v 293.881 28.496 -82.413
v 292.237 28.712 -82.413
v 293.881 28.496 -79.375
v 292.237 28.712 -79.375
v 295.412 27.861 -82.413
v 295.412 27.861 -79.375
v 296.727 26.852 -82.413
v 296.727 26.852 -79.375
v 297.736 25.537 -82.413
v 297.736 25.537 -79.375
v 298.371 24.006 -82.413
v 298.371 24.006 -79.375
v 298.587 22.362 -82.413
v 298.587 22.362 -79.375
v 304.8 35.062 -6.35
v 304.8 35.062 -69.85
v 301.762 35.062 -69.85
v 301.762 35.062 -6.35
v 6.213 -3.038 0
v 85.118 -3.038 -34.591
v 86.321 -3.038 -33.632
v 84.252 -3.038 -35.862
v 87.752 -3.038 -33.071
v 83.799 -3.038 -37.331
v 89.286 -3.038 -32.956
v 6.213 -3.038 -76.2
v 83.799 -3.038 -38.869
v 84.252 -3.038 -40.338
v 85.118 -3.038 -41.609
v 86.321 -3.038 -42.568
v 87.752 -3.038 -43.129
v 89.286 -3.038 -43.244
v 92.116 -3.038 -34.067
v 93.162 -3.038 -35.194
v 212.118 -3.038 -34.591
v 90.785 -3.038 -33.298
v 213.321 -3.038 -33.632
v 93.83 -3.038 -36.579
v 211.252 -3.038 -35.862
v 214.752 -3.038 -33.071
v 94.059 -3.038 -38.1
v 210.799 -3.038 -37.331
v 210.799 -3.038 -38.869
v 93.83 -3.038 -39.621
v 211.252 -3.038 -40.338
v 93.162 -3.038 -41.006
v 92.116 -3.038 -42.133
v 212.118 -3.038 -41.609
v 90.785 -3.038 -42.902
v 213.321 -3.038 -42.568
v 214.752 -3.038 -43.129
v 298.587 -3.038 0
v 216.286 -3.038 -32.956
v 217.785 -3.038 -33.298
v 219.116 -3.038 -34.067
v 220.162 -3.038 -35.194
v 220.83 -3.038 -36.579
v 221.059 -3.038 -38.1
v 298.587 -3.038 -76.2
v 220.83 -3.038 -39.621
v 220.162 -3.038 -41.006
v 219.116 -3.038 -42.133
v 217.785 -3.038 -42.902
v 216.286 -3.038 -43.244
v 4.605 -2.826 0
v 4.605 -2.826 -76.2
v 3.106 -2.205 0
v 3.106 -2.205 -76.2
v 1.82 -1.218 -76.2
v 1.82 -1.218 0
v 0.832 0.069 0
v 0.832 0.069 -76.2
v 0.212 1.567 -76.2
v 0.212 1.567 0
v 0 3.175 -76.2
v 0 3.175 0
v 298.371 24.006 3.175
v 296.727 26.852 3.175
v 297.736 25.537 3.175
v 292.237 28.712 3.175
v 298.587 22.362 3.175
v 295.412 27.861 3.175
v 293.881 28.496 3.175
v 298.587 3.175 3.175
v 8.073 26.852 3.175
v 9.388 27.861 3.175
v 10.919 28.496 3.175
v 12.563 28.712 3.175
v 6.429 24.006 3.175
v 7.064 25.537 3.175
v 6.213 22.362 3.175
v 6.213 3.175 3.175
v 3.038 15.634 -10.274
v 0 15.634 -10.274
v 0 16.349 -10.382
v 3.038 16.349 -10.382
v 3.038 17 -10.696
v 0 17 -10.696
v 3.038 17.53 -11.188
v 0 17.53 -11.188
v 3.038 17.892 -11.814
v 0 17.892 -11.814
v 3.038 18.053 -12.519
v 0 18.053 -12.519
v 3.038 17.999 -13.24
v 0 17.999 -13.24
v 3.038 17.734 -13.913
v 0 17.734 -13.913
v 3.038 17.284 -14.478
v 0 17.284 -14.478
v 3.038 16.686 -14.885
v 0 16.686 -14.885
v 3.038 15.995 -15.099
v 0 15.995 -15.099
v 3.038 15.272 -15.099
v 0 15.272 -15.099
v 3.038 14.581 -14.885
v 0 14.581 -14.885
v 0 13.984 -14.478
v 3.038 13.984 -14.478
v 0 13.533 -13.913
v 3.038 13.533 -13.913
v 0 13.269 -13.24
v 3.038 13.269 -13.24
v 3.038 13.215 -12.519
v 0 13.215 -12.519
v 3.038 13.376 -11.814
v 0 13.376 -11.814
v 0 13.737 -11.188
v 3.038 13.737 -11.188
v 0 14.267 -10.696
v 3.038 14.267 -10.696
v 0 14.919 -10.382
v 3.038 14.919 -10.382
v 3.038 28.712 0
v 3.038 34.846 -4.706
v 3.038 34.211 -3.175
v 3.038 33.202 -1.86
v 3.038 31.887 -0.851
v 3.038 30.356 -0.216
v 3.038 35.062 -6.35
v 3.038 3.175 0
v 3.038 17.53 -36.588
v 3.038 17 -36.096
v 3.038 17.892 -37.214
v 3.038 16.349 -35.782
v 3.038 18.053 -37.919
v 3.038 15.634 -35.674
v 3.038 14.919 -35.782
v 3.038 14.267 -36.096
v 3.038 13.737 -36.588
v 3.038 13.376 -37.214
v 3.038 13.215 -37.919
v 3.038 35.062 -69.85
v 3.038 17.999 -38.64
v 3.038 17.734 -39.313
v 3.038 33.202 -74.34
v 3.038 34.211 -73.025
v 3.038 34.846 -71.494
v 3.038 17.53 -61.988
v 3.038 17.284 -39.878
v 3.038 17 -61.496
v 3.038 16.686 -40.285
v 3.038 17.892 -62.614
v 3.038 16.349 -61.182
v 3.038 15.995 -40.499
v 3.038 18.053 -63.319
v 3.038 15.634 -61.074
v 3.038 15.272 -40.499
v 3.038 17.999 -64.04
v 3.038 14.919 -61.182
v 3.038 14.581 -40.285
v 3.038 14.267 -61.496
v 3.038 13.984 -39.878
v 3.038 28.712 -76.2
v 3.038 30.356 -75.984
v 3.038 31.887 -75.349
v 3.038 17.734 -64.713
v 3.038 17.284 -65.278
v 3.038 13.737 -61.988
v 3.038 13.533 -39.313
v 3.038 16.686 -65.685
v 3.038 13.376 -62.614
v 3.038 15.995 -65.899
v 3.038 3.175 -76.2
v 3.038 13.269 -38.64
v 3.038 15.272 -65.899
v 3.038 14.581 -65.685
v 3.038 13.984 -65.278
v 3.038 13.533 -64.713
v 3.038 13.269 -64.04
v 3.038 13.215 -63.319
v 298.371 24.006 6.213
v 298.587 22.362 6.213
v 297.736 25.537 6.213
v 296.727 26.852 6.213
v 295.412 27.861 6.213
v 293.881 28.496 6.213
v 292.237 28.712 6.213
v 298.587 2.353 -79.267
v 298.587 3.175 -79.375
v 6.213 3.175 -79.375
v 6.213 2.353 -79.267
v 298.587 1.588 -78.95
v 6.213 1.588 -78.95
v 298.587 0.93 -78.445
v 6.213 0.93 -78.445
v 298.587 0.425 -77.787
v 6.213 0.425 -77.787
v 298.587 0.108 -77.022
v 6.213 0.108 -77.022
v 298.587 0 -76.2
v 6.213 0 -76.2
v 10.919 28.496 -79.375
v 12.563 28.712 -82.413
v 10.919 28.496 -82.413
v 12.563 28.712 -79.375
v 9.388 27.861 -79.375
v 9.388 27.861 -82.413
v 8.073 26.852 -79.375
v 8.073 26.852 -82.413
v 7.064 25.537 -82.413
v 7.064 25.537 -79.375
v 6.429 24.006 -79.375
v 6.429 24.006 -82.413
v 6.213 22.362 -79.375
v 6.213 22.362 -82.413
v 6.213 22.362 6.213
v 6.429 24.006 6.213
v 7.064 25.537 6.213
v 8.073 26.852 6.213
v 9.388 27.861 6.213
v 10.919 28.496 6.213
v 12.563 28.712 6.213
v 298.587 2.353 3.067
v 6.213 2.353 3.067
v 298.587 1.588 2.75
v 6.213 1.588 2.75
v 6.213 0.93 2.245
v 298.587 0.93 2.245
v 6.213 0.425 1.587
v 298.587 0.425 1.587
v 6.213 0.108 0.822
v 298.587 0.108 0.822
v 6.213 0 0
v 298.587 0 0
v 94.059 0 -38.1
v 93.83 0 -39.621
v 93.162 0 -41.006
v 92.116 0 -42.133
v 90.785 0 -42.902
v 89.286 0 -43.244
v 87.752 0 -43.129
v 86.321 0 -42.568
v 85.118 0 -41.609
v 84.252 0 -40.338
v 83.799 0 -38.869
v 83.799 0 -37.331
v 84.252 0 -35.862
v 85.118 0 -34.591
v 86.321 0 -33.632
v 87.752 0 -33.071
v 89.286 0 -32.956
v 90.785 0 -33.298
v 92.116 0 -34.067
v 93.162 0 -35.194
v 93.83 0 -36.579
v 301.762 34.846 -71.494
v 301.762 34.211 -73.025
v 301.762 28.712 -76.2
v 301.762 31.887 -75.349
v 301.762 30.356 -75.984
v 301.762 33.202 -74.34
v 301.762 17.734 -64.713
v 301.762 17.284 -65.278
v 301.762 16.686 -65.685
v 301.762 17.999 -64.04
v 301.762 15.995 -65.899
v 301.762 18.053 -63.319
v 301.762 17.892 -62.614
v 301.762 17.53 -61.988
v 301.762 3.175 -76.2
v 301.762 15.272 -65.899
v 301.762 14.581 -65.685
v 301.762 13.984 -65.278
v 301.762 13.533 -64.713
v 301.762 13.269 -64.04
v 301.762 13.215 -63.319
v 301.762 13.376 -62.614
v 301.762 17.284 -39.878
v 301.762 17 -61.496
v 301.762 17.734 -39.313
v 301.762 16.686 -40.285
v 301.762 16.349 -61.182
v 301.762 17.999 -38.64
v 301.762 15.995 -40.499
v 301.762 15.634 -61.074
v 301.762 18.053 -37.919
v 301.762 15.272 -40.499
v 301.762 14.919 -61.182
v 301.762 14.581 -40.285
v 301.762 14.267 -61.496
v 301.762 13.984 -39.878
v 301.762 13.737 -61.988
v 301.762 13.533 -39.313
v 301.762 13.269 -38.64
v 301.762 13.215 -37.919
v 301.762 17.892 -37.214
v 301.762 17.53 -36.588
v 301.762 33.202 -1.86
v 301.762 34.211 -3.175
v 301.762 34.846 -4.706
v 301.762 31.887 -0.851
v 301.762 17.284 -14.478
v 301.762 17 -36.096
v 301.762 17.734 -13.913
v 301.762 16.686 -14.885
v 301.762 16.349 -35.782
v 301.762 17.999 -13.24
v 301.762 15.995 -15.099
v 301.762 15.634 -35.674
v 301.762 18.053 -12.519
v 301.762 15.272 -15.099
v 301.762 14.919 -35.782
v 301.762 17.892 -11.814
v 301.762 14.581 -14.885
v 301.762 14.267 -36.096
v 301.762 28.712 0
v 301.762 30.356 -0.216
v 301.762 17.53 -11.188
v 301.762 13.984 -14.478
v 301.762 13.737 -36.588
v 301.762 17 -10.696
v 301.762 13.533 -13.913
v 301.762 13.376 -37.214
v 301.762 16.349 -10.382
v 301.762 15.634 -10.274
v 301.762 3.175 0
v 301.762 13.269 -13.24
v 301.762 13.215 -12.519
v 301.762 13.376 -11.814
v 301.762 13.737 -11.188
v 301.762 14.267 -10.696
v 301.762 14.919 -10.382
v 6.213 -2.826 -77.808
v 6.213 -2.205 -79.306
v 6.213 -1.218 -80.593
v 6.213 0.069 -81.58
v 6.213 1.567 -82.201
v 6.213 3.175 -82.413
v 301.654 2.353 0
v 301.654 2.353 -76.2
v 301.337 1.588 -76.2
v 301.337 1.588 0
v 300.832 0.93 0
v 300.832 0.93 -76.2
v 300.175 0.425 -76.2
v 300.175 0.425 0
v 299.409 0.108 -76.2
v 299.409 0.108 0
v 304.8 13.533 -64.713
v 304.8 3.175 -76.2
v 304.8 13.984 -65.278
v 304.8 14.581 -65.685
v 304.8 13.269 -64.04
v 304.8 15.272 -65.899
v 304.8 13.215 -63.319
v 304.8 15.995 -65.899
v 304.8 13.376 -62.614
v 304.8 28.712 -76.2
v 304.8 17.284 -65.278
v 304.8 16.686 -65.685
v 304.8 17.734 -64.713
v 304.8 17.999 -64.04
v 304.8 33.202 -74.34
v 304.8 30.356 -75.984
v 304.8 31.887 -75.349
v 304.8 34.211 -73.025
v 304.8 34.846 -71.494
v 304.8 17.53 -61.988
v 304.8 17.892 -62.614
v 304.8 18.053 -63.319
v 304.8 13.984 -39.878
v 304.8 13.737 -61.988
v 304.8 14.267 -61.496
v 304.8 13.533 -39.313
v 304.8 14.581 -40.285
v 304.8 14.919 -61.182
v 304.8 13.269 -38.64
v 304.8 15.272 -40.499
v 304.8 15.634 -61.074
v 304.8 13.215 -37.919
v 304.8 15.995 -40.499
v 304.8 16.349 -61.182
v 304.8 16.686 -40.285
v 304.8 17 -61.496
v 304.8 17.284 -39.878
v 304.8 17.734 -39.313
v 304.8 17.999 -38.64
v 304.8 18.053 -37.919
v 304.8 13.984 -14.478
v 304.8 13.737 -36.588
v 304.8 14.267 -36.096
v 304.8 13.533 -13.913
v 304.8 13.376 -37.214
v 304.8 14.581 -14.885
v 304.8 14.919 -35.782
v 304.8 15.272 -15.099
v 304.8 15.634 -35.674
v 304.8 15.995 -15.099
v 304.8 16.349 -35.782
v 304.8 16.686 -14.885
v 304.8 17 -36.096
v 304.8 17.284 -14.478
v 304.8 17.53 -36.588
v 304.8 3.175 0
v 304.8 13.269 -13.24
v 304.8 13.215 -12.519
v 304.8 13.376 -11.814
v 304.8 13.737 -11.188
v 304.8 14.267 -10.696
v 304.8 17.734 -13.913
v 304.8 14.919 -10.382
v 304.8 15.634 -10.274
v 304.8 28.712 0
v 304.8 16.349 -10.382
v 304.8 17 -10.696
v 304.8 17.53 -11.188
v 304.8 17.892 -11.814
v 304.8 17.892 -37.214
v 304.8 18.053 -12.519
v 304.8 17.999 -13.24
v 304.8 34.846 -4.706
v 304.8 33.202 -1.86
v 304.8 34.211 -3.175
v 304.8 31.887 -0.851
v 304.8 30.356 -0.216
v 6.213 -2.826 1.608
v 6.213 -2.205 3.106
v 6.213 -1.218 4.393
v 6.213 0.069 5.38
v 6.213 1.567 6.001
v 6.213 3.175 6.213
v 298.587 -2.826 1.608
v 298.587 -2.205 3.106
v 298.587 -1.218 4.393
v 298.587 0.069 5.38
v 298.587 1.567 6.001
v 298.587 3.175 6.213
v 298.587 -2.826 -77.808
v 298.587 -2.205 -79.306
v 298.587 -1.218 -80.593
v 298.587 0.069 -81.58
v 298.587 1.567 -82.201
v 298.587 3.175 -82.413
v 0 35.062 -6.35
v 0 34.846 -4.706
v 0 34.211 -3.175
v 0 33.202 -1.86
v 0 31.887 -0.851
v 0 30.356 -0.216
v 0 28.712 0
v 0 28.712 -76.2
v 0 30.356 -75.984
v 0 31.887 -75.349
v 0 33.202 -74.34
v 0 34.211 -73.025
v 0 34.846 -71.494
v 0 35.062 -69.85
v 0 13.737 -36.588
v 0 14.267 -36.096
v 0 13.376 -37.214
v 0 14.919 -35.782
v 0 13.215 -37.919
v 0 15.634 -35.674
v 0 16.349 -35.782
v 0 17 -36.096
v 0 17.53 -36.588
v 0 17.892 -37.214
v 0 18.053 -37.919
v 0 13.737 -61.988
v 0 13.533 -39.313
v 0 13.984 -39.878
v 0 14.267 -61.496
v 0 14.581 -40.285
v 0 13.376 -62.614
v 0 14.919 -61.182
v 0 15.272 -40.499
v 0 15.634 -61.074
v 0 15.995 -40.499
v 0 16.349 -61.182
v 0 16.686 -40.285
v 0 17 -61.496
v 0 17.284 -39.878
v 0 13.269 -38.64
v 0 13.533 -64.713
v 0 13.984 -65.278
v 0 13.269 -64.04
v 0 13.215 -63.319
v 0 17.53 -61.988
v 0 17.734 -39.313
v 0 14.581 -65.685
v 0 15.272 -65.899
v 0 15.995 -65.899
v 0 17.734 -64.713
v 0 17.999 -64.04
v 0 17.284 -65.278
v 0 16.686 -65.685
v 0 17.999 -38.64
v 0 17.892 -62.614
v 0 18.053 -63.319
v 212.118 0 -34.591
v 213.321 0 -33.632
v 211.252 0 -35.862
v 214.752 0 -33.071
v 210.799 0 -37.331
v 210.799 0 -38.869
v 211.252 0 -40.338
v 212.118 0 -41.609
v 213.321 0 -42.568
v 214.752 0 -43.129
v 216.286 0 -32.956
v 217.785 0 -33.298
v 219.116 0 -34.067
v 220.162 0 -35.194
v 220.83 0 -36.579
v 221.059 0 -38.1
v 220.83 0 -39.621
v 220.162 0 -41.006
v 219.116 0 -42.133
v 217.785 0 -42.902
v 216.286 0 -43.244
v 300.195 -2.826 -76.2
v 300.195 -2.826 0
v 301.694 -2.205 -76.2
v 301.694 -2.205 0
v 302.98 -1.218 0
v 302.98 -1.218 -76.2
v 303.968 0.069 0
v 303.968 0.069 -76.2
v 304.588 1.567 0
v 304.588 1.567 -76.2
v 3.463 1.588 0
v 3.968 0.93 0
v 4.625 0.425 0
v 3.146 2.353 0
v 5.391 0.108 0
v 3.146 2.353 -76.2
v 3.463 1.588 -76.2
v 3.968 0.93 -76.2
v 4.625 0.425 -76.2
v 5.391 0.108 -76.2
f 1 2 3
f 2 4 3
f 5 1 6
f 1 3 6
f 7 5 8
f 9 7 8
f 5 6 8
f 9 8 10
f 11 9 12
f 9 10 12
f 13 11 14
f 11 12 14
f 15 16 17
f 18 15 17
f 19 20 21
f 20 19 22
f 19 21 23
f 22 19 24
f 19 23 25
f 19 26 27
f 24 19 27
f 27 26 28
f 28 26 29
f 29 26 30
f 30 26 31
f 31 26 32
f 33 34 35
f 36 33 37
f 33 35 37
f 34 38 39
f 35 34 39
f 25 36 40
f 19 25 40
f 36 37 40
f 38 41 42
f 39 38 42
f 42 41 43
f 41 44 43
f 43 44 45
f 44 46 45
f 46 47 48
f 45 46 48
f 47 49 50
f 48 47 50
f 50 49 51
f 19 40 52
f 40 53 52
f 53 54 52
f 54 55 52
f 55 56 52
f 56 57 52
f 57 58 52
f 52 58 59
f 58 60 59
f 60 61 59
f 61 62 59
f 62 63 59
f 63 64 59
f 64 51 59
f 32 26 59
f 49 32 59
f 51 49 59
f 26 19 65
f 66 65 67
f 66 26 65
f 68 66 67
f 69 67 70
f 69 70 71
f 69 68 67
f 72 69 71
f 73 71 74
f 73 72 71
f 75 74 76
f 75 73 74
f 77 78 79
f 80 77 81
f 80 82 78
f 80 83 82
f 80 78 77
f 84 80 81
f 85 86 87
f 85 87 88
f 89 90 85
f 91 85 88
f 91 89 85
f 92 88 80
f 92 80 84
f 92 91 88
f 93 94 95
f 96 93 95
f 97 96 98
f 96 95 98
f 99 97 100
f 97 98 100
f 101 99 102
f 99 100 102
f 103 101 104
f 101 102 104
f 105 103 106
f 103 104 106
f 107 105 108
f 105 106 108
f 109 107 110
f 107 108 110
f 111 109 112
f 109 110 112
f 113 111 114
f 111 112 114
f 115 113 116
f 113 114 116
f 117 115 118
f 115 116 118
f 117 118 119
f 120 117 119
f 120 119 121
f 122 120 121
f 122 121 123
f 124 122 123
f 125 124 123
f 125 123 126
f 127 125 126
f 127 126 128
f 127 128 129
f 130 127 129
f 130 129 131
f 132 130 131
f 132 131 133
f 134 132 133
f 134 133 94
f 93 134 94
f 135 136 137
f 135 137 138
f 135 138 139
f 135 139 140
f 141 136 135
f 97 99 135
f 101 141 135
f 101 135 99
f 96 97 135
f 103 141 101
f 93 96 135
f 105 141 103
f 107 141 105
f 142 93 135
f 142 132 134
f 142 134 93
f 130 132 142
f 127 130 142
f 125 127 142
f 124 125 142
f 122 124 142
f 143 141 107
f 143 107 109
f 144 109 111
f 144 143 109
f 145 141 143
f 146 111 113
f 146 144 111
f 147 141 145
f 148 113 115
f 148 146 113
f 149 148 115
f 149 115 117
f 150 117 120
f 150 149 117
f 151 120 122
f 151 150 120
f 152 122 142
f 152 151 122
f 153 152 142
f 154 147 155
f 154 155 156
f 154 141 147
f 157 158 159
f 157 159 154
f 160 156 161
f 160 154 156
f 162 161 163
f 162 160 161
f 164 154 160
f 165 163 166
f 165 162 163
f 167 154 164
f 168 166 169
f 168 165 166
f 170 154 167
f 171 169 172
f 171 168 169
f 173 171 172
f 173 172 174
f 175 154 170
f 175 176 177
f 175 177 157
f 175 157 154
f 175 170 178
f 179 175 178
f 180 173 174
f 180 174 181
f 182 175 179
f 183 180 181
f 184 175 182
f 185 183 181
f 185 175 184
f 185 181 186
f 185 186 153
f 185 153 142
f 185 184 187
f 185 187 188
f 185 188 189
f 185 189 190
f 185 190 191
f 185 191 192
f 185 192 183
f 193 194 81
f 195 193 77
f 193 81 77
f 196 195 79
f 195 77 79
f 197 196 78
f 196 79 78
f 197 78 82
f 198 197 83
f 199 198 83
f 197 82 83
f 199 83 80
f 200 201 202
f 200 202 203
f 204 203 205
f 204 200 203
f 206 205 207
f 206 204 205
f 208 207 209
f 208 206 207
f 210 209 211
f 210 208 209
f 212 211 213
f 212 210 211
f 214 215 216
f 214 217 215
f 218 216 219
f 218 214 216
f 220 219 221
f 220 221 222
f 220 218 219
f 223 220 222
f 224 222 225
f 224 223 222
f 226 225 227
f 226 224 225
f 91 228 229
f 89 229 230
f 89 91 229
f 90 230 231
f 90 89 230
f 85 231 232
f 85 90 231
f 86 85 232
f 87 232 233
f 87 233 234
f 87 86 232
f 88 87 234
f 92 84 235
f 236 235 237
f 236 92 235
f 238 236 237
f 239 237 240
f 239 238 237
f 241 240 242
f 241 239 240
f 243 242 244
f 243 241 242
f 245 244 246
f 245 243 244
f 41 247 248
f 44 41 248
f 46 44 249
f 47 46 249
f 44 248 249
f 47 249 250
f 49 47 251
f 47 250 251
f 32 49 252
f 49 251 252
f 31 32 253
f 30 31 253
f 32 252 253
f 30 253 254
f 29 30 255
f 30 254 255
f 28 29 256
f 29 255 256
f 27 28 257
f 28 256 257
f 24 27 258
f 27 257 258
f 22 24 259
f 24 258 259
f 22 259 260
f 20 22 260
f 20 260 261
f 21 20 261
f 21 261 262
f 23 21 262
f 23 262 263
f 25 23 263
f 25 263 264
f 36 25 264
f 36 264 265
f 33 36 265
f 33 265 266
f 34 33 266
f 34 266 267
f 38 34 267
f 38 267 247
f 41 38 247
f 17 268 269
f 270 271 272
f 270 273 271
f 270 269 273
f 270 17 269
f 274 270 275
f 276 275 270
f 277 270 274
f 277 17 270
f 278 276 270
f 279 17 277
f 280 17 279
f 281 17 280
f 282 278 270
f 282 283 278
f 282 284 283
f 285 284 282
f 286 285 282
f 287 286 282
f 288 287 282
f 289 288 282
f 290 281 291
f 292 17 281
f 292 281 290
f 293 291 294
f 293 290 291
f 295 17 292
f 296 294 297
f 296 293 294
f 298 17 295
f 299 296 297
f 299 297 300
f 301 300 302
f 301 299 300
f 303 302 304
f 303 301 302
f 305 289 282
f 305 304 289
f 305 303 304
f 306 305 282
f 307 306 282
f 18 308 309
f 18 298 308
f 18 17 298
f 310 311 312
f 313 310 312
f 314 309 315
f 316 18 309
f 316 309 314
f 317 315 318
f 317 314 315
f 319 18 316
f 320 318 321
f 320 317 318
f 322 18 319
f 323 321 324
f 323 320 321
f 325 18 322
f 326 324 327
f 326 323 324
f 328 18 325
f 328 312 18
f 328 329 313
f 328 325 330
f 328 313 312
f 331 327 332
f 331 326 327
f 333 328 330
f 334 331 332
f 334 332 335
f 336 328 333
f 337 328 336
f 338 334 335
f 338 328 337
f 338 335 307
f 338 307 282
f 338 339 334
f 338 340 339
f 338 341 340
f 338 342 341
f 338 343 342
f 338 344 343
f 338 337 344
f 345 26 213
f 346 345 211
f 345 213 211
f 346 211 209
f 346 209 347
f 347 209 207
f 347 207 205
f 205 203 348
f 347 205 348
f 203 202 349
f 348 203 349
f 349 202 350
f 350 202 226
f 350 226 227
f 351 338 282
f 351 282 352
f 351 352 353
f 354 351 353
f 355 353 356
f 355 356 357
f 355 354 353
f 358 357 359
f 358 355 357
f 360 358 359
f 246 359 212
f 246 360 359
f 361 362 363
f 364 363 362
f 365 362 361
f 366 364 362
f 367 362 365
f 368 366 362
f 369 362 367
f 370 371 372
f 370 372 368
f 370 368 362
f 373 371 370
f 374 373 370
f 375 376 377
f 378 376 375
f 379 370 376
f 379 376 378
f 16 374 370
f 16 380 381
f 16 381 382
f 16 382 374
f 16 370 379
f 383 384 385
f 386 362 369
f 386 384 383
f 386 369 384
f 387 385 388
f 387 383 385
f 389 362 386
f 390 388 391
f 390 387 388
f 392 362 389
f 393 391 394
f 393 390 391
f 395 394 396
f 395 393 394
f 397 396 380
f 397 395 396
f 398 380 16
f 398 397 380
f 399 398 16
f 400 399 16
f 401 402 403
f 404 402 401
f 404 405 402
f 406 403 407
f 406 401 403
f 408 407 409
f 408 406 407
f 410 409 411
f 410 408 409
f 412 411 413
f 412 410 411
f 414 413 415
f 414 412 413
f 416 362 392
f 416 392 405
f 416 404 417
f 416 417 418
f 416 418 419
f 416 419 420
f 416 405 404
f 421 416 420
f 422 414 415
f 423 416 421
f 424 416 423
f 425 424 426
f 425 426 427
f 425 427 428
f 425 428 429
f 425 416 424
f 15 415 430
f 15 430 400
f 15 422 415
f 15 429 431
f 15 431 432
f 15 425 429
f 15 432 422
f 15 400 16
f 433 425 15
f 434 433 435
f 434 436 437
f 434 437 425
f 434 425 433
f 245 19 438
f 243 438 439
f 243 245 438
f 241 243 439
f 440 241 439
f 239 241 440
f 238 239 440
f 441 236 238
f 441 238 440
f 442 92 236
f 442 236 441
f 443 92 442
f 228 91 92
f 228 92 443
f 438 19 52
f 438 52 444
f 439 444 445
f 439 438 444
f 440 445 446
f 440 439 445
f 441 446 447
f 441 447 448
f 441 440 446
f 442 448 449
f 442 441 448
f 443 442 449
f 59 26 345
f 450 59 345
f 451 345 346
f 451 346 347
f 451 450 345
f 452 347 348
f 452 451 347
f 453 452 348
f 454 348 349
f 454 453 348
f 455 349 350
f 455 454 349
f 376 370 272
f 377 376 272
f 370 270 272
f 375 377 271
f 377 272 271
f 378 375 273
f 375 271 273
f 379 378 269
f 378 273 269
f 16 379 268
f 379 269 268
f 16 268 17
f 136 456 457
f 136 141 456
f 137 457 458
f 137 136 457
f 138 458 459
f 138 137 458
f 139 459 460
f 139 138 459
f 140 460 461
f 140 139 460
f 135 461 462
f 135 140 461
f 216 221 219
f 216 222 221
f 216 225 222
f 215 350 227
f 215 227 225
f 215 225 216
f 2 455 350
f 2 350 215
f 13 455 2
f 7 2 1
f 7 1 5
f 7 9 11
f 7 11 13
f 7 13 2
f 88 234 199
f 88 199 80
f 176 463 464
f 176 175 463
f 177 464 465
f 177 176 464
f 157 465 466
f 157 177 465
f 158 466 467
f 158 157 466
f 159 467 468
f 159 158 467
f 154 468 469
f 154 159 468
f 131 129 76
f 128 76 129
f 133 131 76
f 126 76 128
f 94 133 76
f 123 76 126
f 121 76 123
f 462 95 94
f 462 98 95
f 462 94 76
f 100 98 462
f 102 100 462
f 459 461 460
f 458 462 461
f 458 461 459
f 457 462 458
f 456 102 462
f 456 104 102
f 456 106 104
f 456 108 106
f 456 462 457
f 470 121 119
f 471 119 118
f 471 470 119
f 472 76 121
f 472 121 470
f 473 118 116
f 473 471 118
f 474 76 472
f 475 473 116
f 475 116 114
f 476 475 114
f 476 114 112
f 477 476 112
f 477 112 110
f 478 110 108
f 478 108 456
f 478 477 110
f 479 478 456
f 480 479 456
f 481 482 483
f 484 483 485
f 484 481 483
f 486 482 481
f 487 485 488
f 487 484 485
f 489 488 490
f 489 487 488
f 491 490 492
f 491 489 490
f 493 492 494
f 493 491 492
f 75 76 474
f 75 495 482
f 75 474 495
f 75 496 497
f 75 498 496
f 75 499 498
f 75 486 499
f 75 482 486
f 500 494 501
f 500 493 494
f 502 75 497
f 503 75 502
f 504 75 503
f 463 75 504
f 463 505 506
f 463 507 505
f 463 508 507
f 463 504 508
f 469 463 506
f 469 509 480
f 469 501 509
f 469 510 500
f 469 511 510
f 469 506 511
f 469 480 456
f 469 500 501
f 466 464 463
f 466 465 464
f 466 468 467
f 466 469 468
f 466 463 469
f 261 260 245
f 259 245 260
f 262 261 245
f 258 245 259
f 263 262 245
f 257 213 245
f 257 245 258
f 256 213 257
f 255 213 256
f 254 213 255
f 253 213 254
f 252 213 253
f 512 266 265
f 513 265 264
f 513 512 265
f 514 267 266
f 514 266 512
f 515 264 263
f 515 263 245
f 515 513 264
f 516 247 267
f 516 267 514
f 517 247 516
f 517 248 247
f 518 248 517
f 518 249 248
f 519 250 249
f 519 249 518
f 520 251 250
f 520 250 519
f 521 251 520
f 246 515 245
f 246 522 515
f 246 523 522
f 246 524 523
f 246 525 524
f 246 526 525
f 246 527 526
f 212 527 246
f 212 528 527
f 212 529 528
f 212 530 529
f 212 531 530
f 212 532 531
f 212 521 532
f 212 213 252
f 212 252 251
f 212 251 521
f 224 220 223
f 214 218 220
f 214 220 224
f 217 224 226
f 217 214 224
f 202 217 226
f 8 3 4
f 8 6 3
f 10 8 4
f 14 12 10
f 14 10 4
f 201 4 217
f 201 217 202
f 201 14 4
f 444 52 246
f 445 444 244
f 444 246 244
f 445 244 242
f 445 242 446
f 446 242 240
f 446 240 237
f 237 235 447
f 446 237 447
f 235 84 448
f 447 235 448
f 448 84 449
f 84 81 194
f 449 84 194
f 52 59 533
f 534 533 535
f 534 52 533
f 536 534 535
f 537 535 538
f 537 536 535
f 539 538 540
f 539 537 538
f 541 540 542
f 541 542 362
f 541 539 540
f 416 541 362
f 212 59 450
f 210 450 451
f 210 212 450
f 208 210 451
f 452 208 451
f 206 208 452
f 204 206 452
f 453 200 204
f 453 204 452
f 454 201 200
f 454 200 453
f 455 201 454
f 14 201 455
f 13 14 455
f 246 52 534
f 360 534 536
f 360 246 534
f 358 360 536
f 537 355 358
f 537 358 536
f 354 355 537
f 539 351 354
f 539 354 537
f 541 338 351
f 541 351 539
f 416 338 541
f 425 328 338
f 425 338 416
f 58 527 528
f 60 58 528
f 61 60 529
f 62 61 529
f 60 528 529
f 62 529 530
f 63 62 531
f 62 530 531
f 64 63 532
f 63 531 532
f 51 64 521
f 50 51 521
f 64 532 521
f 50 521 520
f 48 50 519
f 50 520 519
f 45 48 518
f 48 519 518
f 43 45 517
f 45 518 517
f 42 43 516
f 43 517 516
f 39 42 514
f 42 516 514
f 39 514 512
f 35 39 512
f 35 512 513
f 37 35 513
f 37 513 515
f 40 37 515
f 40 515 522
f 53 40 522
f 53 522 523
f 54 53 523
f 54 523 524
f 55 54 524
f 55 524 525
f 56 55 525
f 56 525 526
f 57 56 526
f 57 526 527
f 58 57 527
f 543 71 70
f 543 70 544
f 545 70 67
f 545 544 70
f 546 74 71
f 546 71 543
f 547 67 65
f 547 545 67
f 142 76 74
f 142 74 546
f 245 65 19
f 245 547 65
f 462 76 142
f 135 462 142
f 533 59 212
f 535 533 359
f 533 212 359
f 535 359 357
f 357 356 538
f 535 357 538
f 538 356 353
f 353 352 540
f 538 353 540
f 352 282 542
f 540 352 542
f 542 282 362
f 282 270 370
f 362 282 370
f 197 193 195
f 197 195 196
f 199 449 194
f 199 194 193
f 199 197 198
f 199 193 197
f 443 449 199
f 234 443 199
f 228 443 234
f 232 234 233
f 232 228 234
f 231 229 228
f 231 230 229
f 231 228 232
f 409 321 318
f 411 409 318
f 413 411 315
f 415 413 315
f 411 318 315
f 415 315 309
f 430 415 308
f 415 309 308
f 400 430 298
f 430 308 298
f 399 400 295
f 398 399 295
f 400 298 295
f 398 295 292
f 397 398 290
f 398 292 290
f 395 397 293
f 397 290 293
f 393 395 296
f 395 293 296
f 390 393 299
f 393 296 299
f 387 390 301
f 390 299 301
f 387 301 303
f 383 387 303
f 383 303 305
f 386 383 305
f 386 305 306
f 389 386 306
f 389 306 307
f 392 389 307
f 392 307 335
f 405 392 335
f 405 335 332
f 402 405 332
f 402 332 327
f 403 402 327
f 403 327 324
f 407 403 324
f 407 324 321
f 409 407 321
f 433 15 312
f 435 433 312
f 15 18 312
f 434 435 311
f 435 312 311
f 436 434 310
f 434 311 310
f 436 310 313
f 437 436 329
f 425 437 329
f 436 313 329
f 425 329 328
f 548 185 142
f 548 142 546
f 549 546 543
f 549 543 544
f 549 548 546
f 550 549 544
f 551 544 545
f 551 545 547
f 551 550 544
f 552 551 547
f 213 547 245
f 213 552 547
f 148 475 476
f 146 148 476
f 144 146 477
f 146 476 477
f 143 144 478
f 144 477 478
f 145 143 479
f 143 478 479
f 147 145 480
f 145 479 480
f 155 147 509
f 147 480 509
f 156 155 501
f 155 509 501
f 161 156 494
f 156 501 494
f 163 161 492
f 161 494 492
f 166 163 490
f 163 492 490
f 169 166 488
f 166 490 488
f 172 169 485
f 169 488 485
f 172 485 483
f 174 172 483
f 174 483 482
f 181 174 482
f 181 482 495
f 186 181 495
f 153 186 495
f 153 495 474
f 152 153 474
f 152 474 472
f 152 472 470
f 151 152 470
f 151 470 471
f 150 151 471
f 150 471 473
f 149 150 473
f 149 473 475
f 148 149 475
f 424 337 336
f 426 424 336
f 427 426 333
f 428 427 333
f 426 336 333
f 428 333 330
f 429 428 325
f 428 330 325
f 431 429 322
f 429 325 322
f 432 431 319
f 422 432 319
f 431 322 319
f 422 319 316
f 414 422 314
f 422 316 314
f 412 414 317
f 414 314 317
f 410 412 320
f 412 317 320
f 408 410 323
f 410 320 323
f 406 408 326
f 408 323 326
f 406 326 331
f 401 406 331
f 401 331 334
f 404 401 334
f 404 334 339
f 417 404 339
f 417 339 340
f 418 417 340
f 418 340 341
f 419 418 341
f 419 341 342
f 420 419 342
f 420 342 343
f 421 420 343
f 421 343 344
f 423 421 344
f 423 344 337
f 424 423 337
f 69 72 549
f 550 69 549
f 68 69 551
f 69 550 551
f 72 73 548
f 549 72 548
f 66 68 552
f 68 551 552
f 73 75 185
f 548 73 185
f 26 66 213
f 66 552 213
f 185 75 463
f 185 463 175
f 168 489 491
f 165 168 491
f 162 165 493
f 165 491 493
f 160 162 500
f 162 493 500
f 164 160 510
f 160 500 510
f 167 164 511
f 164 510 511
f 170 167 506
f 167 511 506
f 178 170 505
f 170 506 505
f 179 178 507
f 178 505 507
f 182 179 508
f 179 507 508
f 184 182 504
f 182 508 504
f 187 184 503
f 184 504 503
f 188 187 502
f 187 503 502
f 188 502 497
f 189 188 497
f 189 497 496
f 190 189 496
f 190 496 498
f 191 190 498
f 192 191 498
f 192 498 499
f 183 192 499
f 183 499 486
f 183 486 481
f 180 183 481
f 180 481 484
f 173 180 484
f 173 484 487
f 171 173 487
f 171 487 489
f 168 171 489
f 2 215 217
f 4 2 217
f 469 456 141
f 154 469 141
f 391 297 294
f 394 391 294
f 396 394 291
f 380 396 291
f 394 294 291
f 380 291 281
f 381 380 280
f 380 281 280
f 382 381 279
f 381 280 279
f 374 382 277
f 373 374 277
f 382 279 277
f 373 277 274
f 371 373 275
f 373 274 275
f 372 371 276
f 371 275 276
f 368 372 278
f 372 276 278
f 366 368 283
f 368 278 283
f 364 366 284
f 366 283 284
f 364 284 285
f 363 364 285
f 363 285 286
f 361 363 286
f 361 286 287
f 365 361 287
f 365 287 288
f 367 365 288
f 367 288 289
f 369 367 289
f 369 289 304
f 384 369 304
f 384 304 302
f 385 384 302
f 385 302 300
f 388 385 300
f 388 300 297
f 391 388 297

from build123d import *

# Parameters (mm, degrees)
SKETCH1_W                      = 304.8
SKETCH1_H                      = 76.2
BASE_FLANGE1_DEPTH             = 3.03784
EDGE_FLANGE1_STRIP_W           = 18.50136
EDGE_FLANGE1_STRIP_H           = 3.03784
EDGE_FLANGE1_STRIP_CUT_DEPTH   = 76.2
EDGE_FLANGE1_STRIP_2_W         = 18.50136
EDGE_FLANGE1_STRIP_2_H         = 3.03784
EDGE_FLANGE1_STRIP_CUT_2_DEPTH = 76.2
EDGE_FLANGE1_DEPTH             = 76.2
EDGE_FLANGE1_BEND_DEPTH        = 76.2
EDGE_FLANGE2_DEPTH             = 292.37432
EDGE_FLANGE2_BEND_DEPTH        = 292.37432
F_3_8_CLEARANCE_HOLE1_D        = 10.31748
F_11_0_191_DIAMETER_HOLE1_D    = 4.8514
FILLET1_R                      = 6.35


# Sheet-metal steps are written as plain solids
with BuildPart() as part:
    # Sketch1 → Base-Flange1 (new body)
    with BuildSketch(Plane(origin=(0, 0, 0), x_dir=(1, 0, 0), z_dir=(0, 1, 0))):
        with Locations((152.4, 38.1)):
            Rectangle(SKETCH1_W, SKETCH1_H)
    extrude(amount=-BASE_FLANGE1_DEPTH)

    # Edge-Flange1 strip (across the edge) → Edge-Flange1 strip cut (cut)
    with BuildSketch(Plane.XY.offset(-76.2)):
        with Locations((-3.03784, -1.51892)):
            Rectangle(EDGE_FLANGE1_STRIP_W, EDGE_FLANGE1_STRIP_H)
    extrude(amount=EDGE_FLANGE1_STRIP_CUT_DEPTH, mode=Mode.SUBTRACT)

    # Edge-Flange1 strip 2 (across the edge) → Edge-Flange1 strip cut 2 (cut)
    with BuildSketch(Plane(origin=(304.8, 0, 0), x_dir=(-1, 0, 0), z_dir=(0, 0, -1))):
        with Locations((-3.03784, -1.51892)):
            Rectangle(EDGE_FLANGE1_STRIP_2_W, EDGE_FLANGE1_STRIP_2_H)
    extrude(amount=EDGE_FLANGE1_STRIP_CUT_2_DEPTH, mode=Mode.SUBTRACT)

    # Edge-Flange1 section (across the edge) → Edge-Flange1 (add)
    with BuildSketch(Plane.XY.offset(-76.2)):
        with BuildLine():
            Line((0, 3.175), (0, 35.06216))
            Line((0, 35.06216), (3.03784, 35.06216))
            Line((3.03784, 35.06216), (3.03784, 3.175))
            ThreePointArc((3.03784, 3.175), (3.96777597, 0.92993597), (6.21284, 0))
            Line((6.21284, 0), (6.21284, -3.03784))
            ThreePointArc((6.21284, -3.03784), (1.819698706, -1.218141294), (0, 3.175))
        make_face()
    extrude(amount=EDGE_FLANGE1_DEPTH)

    # Edge-Flange1 section 2 (across the edge) → Edge-Flange1 bend (add)
    with BuildSketch(Plane(origin=(304.8, 0, 0), x_dir=(-1, 0, 0), z_dir=(0, 0, -1))):
        with BuildLine():
            Line((0, 3.175), (0, 35.06216))
            Line((0, 35.06216), (3.03784, 35.06216))
            Line((3.03784, 35.06216), (3.03784, 3.175))
            ThreePointArc((3.03784, 3.175), (3.96777597, 0.92993597), (6.21284, 0))
            Line((6.21284, 0), (6.21284, -3.03784))
            ThreePointArc((6.21284, -3.03784), (1.819698706, -1.218141294), (0, 3.175))
        make_face()
    extrude(amount=EDGE_FLANGE1_BEND_DEPTH)

    # Edge-Flange2 section (across the edge) → Edge-Flange2 (add)
    with BuildSketch(Plane(origin=(6.21284, 0, 3.175), x_dir=(0, 0, -1), z_dir=(1, 0, 0))):
        with BuildLine():
            Line((-3.03784, 3.175), (-3.03784, 28.71216))
            Line((-3.03784, 28.71216), (0, 28.71216))
            Line((0, 28.71216), (0, 3.175))
            ThreePointArc((0, 3.175), (0.92993597, 0.92993597), (3.175, 0))
            Line((3.175, 0), (3.175, -3.03784))
            ThreePointArc((3.175, -3.03784), (-1.218141294, -1.218141294), (-3.03784, 3.175))
        make_face()
    extrude(amount=EDGE_FLANGE2_DEPTH)

    # Edge-Flange2 section 2 (across the edge) → Edge-Flange2 bend (add)
    with BuildSketch(Plane(origin=(298.58716, 0, -79.375), x_dir=(0, 0, 1), z_dir=(-1, 0, 0))):
        with BuildLine():
            Line((-3.03784, 3.175), (-3.03784, 28.71216))
            Line((-3.03784, 28.71216), (0, 28.71216))
            Line((0, 28.71216), (0, 3.175))
            ThreePointArc((0, 3.175), (0.92993597, 0.92993597), (3.175, 0))
            Line((3.175, 0), (3.175, -3.03784))
            ThreePointArc((3.175, -3.03784), (-1.218141294, -1.218141294), (-3.03784, 3.175))
        make_face()
    extrude(amount=EDGE_FLANGE2_BEND_DEPTH)

    # 3/8 Clearance Hole1 (through all)
    with Locations(Plane(origin=(0, -3.03784, 0), x_dir=(-1, 0, 0), z_dir=(0, -1, 0))):
        with Locations((-88.9, 38.1), (-215.9, 38.1)):
            Hole(F_3_8_CLEARANCE_HOLE1_D / 2)

    # #11 (0.191) Diameter Hole1 (through all)
    with Locations(Plane(origin=(304.8, 0, 0), x_dir=(0, 0, -1), z_dir=(1, 0, 0))):
        with Locations((12.7, 15.6337), (38.1, 15.6337), (63.5, 15.6337)):
            Hole(F_11_0_191_DIAMETER_HOLE1_D / 2)

    # Fillet1
    fillet1_edges = [part.edges().sort_by_distance(p)[0] for p in [
        (1.51892, 35.06216, 0),
        (6.21284, 28.71216, 4.69392),
        (1.51892, 35.06216, -76.2),
        (298.58716, 28.71216, 4.69392),
        (6.21284, 28.71216, -80.89392),
        (303.28108, 35.06216, 0),
        (298.58716, 28.71216, -80.89392),
        (303.28108, 35.06216, -76.2),
    ]]
    fillet(fillet1_edges, radius=FILLET1_R)


solid = part.part
